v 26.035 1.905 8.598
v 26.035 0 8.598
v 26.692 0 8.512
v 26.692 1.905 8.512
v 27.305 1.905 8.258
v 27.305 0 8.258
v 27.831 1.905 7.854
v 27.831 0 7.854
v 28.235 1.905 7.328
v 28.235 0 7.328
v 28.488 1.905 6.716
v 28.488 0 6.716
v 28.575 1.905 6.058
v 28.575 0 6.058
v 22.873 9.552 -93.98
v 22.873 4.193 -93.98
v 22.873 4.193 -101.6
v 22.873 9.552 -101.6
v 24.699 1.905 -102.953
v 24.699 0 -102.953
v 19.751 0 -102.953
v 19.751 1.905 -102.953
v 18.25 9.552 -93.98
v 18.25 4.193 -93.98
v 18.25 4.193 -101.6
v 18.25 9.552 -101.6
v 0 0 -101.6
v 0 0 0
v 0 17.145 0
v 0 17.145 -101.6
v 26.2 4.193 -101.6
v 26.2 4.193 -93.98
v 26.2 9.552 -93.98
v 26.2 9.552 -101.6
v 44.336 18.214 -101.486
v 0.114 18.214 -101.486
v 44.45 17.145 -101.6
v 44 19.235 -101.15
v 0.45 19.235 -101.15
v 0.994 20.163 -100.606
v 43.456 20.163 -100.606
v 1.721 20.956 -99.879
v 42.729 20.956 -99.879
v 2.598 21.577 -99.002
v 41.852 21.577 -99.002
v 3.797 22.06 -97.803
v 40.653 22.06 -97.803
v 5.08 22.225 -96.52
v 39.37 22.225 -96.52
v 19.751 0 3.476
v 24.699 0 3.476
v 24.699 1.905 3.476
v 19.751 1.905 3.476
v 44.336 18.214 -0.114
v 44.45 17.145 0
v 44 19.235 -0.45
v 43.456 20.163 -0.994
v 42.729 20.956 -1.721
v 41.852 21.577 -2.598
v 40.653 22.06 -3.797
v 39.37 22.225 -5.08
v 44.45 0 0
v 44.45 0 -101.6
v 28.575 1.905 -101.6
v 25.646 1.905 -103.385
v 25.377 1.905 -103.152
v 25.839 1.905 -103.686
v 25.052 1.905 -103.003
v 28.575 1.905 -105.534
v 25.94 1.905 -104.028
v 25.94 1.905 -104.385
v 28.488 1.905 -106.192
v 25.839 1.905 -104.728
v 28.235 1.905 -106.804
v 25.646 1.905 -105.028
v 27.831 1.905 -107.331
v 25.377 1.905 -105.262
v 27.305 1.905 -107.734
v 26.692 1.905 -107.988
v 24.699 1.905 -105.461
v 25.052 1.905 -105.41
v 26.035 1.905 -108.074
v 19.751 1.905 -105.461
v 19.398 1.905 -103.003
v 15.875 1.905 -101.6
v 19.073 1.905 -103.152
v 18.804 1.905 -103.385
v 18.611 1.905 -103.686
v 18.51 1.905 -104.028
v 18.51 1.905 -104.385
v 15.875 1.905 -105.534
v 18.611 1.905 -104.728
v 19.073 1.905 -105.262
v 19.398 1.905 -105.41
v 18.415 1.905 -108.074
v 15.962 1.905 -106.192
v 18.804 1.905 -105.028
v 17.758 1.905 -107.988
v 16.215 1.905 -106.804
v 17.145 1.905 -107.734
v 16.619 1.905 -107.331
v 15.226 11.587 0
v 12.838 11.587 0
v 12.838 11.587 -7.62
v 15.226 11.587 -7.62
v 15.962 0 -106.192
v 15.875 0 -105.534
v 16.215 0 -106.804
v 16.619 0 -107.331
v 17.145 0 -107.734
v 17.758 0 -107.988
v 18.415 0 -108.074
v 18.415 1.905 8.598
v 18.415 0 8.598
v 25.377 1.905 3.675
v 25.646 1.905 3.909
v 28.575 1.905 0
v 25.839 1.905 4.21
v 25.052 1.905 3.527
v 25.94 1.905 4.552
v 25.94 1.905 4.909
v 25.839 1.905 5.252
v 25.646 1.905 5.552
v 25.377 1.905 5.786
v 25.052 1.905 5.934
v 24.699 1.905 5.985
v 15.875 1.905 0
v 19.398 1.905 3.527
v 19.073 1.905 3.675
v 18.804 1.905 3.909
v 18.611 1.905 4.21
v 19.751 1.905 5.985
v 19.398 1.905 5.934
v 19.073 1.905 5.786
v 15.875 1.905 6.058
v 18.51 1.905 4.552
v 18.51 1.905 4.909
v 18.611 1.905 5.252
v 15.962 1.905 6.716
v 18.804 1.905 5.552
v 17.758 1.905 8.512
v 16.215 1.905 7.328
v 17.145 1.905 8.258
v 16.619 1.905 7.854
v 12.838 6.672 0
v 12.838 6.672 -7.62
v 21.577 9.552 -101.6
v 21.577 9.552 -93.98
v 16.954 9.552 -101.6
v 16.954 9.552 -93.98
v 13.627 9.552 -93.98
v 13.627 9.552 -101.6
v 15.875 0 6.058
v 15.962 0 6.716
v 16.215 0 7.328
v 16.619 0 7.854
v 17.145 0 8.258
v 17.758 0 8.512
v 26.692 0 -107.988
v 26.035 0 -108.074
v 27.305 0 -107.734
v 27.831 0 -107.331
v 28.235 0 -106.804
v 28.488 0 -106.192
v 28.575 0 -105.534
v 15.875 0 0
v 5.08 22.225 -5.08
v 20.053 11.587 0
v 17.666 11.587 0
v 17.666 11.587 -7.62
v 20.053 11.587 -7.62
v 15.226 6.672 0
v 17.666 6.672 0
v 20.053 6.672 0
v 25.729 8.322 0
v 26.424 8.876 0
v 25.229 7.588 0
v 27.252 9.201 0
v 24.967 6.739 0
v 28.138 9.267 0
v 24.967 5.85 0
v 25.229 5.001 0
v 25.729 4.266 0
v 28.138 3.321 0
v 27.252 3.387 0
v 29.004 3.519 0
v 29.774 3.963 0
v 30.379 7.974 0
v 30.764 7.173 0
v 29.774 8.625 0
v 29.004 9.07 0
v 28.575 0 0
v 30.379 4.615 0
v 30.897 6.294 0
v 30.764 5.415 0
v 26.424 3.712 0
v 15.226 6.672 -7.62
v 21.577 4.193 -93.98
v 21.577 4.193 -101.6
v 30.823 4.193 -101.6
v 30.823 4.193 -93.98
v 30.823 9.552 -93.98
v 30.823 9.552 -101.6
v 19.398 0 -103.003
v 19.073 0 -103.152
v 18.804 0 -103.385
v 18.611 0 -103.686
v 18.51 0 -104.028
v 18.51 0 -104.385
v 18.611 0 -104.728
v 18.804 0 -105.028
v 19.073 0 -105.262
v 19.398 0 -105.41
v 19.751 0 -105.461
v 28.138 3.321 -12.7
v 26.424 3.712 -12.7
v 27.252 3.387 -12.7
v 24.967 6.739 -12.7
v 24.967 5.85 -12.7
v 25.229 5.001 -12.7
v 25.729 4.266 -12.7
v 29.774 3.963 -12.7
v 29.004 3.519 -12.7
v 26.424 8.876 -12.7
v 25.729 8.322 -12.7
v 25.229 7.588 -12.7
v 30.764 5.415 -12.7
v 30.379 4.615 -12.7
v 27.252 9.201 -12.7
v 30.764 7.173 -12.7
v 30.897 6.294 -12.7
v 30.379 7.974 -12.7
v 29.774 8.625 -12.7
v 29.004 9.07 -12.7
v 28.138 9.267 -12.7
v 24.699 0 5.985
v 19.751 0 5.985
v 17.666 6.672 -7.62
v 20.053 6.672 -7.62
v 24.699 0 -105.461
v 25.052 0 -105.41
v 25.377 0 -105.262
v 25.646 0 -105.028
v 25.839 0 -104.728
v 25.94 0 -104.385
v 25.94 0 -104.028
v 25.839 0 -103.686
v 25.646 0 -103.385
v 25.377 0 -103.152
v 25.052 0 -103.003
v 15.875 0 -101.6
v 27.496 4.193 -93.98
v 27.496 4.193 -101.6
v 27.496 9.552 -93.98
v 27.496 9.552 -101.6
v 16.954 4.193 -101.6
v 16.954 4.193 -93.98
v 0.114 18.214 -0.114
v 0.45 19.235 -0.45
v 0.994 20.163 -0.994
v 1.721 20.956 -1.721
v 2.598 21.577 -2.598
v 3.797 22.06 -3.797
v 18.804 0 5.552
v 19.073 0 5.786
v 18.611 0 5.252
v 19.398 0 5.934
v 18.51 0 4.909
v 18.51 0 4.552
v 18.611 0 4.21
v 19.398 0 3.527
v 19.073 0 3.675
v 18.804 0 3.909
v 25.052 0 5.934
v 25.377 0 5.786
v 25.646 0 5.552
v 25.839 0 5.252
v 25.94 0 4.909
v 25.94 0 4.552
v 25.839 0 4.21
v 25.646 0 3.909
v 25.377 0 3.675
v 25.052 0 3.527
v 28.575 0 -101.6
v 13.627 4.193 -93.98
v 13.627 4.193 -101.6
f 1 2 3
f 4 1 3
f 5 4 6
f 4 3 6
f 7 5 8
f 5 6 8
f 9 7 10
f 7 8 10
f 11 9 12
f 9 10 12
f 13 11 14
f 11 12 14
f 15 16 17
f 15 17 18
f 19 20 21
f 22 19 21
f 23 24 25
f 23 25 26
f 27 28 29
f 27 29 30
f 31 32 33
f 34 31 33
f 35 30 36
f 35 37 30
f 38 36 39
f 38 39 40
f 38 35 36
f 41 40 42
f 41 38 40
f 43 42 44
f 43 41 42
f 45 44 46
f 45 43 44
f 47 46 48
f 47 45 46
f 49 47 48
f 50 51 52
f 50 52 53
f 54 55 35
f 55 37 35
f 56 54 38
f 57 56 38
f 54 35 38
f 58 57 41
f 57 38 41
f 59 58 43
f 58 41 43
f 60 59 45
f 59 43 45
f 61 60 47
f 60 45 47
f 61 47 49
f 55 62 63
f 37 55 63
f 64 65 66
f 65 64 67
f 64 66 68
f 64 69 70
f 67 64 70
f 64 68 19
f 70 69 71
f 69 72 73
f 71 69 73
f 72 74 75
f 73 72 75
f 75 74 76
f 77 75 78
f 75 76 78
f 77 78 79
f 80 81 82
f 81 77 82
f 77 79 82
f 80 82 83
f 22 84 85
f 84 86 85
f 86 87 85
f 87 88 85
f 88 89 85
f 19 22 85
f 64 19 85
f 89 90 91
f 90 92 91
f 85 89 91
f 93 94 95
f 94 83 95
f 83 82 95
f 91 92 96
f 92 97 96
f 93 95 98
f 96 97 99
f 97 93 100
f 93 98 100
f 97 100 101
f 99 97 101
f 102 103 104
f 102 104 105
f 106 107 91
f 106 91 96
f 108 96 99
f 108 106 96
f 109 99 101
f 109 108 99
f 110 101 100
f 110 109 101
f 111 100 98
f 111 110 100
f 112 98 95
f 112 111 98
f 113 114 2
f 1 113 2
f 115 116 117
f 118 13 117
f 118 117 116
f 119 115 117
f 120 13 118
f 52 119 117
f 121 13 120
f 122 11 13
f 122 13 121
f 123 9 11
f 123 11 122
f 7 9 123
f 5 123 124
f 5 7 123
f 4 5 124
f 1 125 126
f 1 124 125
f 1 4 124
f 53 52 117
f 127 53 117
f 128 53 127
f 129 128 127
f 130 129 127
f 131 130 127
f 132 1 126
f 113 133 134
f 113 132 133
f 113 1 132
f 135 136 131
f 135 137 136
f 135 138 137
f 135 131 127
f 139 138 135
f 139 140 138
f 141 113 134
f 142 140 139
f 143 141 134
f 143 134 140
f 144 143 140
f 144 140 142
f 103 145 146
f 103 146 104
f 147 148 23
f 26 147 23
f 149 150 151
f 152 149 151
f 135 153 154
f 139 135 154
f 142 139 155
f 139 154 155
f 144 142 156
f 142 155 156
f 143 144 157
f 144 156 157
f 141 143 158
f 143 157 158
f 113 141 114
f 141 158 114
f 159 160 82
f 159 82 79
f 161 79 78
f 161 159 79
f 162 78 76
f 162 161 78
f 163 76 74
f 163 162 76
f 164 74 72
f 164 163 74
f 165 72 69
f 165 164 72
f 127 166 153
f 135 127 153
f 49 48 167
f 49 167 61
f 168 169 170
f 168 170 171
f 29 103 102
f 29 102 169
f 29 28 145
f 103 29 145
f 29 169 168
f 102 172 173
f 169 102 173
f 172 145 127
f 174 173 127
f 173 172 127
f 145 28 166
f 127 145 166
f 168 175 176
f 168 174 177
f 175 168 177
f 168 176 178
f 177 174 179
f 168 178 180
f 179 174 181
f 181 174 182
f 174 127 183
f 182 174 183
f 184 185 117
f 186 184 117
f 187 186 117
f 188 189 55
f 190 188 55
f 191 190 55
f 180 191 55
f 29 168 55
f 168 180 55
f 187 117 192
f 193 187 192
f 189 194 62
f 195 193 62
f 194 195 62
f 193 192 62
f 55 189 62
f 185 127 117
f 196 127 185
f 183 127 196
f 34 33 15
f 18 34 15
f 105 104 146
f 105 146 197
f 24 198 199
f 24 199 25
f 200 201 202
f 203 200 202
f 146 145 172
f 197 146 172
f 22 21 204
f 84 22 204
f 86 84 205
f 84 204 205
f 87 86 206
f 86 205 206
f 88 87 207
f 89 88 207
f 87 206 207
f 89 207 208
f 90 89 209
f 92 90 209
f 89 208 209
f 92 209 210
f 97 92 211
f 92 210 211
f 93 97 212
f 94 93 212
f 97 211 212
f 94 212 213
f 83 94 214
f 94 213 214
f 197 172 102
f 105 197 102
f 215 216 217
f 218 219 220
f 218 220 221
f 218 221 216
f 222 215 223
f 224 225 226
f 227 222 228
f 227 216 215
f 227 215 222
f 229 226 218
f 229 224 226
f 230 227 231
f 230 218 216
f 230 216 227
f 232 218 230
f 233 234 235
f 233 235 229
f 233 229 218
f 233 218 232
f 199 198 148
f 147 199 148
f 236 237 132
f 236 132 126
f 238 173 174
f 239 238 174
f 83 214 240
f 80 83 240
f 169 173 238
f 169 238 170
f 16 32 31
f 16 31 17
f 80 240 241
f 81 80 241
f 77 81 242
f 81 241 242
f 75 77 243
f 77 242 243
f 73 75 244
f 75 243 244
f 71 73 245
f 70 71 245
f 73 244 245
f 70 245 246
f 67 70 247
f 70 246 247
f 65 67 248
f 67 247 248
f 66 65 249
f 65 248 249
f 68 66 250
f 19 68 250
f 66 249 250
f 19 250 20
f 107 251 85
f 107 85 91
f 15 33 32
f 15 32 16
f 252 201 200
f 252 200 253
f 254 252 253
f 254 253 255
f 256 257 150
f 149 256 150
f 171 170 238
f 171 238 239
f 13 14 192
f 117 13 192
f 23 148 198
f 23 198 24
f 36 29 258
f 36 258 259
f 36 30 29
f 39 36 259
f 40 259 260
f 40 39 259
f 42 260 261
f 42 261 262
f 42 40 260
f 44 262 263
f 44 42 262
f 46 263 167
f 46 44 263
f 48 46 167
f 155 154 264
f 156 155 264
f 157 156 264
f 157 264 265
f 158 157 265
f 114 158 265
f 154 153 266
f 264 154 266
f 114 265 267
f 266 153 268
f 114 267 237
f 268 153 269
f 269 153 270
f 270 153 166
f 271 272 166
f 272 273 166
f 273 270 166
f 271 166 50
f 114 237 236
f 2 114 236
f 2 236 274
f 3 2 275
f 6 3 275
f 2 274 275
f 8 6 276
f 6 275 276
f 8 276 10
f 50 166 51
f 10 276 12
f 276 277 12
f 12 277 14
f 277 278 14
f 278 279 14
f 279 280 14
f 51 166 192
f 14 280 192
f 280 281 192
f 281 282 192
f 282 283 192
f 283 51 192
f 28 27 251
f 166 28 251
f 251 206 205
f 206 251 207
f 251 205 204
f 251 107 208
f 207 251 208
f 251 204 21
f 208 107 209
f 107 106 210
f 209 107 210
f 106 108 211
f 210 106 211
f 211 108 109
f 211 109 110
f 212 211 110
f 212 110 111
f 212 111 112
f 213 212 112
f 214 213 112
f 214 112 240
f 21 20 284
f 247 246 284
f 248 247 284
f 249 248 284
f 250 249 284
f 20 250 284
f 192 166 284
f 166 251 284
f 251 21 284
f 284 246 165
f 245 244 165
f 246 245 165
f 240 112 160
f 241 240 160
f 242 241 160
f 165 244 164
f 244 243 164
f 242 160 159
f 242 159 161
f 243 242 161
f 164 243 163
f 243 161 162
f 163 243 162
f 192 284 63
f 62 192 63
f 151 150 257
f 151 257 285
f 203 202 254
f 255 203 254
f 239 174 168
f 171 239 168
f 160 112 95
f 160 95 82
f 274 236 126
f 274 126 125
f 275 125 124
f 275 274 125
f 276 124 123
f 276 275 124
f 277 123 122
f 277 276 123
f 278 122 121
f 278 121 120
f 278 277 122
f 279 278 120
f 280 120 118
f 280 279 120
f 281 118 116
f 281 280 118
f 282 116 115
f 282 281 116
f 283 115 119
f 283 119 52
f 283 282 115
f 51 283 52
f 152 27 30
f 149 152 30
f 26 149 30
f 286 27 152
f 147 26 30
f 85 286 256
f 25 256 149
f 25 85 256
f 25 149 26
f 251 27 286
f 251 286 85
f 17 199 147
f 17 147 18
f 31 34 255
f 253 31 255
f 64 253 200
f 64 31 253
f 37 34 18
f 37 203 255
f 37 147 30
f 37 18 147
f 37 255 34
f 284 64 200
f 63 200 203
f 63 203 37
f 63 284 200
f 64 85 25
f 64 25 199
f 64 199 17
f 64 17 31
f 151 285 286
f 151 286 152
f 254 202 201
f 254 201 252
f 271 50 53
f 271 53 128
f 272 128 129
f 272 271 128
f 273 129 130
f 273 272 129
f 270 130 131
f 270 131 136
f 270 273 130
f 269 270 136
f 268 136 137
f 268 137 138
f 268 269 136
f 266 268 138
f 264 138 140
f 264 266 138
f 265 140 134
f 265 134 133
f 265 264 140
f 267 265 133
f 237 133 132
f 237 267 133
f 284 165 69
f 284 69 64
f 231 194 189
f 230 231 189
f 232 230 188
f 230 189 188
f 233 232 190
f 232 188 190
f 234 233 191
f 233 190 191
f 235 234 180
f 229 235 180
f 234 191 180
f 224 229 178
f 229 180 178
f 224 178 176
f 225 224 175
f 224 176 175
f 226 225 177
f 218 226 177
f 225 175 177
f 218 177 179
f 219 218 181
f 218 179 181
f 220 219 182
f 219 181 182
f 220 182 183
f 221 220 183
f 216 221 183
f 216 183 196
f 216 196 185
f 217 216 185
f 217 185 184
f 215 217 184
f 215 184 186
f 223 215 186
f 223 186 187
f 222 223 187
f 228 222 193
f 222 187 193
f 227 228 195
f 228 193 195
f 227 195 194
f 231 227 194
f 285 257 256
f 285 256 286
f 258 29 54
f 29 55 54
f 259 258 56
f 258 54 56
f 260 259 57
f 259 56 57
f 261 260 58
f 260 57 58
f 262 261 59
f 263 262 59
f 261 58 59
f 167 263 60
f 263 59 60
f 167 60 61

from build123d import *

# Parameters (mm, degrees)
SKETCH1_W           = 44.45
SKETCH1_H           = 101.6
BOSS_EXTRUDE1_DEPTH = 22.225
FILLET1_R           = 5.08
SKETCH2_R           = 2.981516586
CUT_EXTRUDE1_DEPTH  = 12.7
SKETCH3_W           = 2.38773998
SKETCH3_H           = 4.914706725
SKETCH3_W_2         = 2.387739981
CUT_EXTRUDE2_DEPTH  = 7.62
SKETCH4_W           = 3.327455713
SKETCH4_H           = 5.359264955
SKETCH4_W_2         = 3.327455714
CUT_EXTRUDE3_DEPTH  = 7.62
BOSS_EXTRUDE2_DEPTH = 1.905


with BuildPart() as part:
    # Sketch1 → Boss-Extrude1 (new body)
    with BuildSketch(Plane(origin=(0, 0, 0), x_dir=(1, 0, 0), z_dir=(0, 1, 0))):
        with Locations((22.225, 50.8)):
            Rectangle(SKETCH1_W, SKETCH1_H)
    extrude(amount=BOSS_EXTRUDE1_DEPTH)

    # Fillet1
    fillet1_edges = [part.edges().sort_by_distance(p)[0] for p in [
        (44.45, 22.225, -50.8),
        (22.225, 22.225, -101.6),
        (0, 22.225, -50.8),
        (22.225, 22.225, 0),
    ]]
    fillet(fillet1_edges, radius=FILLET1_R)

    # Sketch2 → Cut-Extrude1 (cut)
    with BuildSketch(Plane.XY):
        with Locations((27.915098323, 6.294196756)):
            Circle(SKETCH2_R)
    extrude(amount=-CUT_EXTRUDE1_DEPTH, mode=Mode.SUBTRACT)

    # Sketch3 → Cut-Extrude2 (cut)
    with BuildSketch(Plane.XY):
        with Locations((14.031826574, 9.129741005)):
            Rectangle(SKETCH3_W, SKETCH3_H)
        with Locations((18.859604577, 9.129741005)):
            Rectangle(SKETCH3_W_2, SKETCH3_H)
    extrude(amount=-CUT_EXTRUDE2_DEPTH, mode=Mode.SUBTRACT)

    # Sketch4 → Cut-Extrude3 (cut)
    with BuildSketch(Plane(origin=(0, 0, -101.6), x_dir=(-1, 0, 0), z_dir=(0, 0, -1))):
        with Locations((-29.15965328, 6.872202453)):
            Rectangle(SKETCH4_W, SKETCH4_H)
        with Locations((-24.536551093, 6.872202453)):
            Rectangle(SKETCH4_W_2, SKETCH4_H)
        with Locations((-19.913448907, 6.872202453)):
            Rectangle(SKETCH4_W_2, SKETCH4_H)
        with Locations((-15.290346721, 6.872202453)):
            Rectangle(SKETCH4_W, SKETCH4_H)
    extrude(amount=-CUT_EXTRUDE3_DEPTH, mode=Mode.SUBTRACT)

    # Sketch5 → Boss-Extrude2 (add)
    with BuildSketch(Plane.XZ):
        with BuildLine():
            Line((15.875, 0), (15.875, 6.058263516))
            ThreePointArc((15.875, 6.058263516), (16.618948776, 7.85431474), (18.415, 8.598263516))
            Line((18.415, 8.598263516), (26.035, 8.598263516))
            ThreePointArc((26.035, 8.598263516), (27.831051224, 7.85431474), (28.575, 6.058263516))
            Line((28.575, 6.058263516), (28.575, 0))
            Line((28.575, 0), (15.875, 0))
        make_face()
        with BuildLine():
            Line((19.751425895, 5.984747985), (24.698574105, 5.984747985))
            ThreePointArc((24.698574105, 5.984747985), (25.952772297, 4.730549793), (24.698574105, 3.476351601))
            Line((24.698574105, 3.476351601), (19.751425895, 3.476351601))
            ThreePointArc((19.751425895, 3.476351601), (18.497227703, 4.730549793), (19.751425895, 5.984747985))
        make_face(mode=Mode.SUBTRACT)
    boss_extrude2 = extrude(amount=-BOSS_EXTRUDE2_DEPTH)

    # Mirror2: Boss-Extrude2 across plane
    add(boss_extrude2.mirror(Plane.XY.offset(-49.738094236)))


solid = part.part
